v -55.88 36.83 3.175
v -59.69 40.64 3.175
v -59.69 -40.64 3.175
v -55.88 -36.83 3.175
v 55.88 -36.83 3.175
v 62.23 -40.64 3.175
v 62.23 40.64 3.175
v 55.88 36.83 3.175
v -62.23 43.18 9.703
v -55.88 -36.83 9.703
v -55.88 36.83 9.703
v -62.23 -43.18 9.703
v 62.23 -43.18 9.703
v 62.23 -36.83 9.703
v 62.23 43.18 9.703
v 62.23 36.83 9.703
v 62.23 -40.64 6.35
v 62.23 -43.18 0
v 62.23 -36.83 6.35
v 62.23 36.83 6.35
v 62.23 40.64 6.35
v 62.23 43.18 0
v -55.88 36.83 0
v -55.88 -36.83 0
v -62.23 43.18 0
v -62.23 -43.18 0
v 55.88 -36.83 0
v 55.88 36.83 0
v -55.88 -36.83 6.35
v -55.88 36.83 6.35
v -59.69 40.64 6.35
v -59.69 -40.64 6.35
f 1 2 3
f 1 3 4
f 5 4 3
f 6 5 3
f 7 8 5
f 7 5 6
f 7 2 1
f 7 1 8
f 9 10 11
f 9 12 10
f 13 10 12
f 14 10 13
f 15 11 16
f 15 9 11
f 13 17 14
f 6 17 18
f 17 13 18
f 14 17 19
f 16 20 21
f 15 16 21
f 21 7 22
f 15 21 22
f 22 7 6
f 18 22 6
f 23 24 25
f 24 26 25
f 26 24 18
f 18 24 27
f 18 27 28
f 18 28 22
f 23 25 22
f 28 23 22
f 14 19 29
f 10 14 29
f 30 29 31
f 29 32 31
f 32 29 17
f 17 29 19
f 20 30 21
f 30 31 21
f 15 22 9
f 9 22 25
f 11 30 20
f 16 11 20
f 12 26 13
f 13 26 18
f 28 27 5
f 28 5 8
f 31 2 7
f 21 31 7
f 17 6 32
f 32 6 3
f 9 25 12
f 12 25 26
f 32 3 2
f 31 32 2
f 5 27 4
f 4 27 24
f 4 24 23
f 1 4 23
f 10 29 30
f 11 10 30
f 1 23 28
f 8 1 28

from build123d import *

# Parameters (mm, degrees)
F0_W     = 2.54
F0_H     = 3.81
F0_W_2   = 3.81
F0_H_2   = 73.66
F1_DEPTH = 3.175
F2_DEPTH = 9.7028
F3_START = 6.35
F3_DEPTH = 3.3528


with BuildPart() as f1:
    # F0 (on Top) → F1 (new body)
    with BuildSketch(Plane.XY):
        Polygon((-55.88, -36.83), (-55.88, 36.83), (55.88, 36.83), (59.69, 36.83), (59.69, 40.64), (-59.69, 40.64), (-59.69, -40.64), (59.69, -40.64), (59.69, -36.83), (55.88, -36.83), align=None)
        with Locations((60.96, 38.735)):
            Rectangle(F0_W, F0_H)
        with Locations((60.96, -38.735)):
            Rectangle(F0_W, F0_H)
        with Locations((57.785, 0)):
            Rectangle(F0_W_2, F0_H_2)
        with Locations((60.96, 0)):
            Rectangle(F0_W, F0_H_2)
    extrude(amount=F1_DEPTH)

    # F0 (on Top) → F2 (join)
    with BuildSketch(Plane.XY):
        Polygon((-59.69, 40.64), (59.69, 40.64), (62.23, 40.64), (62.23, 43.18), (-62.23, 43.18), (-62.23, -43.18), (62.23, -43.18), (62.23, -40.64), (59.69, -40.64), (-59.69, -40.64), align=None)
    extrude(amount=F2_DEPTH)

    # F0 (on Top) → F3 (join)
    with BuildSketch(Plane.XY.offset(F3_START)):
        Polygon((-55.88, -36.83), (-55.88, 36.83), (55.88, 36.83), (59.69, 36.83), (59.69, 40.64), (-59.69, 40.64), (-59.69, -40.64), (59.69, -40.64), (59.69, -36.83), (55.88, -36.83), align=None)
        with Locations((60.96, -38.735)):
            Rectangle(F0_W, F0_H)
        with Locations((60.96, 38.735)):
            Rectangle(F0_W, F0_H)
    extrude(amount=F3_DEPTH)


solid = f1.part
